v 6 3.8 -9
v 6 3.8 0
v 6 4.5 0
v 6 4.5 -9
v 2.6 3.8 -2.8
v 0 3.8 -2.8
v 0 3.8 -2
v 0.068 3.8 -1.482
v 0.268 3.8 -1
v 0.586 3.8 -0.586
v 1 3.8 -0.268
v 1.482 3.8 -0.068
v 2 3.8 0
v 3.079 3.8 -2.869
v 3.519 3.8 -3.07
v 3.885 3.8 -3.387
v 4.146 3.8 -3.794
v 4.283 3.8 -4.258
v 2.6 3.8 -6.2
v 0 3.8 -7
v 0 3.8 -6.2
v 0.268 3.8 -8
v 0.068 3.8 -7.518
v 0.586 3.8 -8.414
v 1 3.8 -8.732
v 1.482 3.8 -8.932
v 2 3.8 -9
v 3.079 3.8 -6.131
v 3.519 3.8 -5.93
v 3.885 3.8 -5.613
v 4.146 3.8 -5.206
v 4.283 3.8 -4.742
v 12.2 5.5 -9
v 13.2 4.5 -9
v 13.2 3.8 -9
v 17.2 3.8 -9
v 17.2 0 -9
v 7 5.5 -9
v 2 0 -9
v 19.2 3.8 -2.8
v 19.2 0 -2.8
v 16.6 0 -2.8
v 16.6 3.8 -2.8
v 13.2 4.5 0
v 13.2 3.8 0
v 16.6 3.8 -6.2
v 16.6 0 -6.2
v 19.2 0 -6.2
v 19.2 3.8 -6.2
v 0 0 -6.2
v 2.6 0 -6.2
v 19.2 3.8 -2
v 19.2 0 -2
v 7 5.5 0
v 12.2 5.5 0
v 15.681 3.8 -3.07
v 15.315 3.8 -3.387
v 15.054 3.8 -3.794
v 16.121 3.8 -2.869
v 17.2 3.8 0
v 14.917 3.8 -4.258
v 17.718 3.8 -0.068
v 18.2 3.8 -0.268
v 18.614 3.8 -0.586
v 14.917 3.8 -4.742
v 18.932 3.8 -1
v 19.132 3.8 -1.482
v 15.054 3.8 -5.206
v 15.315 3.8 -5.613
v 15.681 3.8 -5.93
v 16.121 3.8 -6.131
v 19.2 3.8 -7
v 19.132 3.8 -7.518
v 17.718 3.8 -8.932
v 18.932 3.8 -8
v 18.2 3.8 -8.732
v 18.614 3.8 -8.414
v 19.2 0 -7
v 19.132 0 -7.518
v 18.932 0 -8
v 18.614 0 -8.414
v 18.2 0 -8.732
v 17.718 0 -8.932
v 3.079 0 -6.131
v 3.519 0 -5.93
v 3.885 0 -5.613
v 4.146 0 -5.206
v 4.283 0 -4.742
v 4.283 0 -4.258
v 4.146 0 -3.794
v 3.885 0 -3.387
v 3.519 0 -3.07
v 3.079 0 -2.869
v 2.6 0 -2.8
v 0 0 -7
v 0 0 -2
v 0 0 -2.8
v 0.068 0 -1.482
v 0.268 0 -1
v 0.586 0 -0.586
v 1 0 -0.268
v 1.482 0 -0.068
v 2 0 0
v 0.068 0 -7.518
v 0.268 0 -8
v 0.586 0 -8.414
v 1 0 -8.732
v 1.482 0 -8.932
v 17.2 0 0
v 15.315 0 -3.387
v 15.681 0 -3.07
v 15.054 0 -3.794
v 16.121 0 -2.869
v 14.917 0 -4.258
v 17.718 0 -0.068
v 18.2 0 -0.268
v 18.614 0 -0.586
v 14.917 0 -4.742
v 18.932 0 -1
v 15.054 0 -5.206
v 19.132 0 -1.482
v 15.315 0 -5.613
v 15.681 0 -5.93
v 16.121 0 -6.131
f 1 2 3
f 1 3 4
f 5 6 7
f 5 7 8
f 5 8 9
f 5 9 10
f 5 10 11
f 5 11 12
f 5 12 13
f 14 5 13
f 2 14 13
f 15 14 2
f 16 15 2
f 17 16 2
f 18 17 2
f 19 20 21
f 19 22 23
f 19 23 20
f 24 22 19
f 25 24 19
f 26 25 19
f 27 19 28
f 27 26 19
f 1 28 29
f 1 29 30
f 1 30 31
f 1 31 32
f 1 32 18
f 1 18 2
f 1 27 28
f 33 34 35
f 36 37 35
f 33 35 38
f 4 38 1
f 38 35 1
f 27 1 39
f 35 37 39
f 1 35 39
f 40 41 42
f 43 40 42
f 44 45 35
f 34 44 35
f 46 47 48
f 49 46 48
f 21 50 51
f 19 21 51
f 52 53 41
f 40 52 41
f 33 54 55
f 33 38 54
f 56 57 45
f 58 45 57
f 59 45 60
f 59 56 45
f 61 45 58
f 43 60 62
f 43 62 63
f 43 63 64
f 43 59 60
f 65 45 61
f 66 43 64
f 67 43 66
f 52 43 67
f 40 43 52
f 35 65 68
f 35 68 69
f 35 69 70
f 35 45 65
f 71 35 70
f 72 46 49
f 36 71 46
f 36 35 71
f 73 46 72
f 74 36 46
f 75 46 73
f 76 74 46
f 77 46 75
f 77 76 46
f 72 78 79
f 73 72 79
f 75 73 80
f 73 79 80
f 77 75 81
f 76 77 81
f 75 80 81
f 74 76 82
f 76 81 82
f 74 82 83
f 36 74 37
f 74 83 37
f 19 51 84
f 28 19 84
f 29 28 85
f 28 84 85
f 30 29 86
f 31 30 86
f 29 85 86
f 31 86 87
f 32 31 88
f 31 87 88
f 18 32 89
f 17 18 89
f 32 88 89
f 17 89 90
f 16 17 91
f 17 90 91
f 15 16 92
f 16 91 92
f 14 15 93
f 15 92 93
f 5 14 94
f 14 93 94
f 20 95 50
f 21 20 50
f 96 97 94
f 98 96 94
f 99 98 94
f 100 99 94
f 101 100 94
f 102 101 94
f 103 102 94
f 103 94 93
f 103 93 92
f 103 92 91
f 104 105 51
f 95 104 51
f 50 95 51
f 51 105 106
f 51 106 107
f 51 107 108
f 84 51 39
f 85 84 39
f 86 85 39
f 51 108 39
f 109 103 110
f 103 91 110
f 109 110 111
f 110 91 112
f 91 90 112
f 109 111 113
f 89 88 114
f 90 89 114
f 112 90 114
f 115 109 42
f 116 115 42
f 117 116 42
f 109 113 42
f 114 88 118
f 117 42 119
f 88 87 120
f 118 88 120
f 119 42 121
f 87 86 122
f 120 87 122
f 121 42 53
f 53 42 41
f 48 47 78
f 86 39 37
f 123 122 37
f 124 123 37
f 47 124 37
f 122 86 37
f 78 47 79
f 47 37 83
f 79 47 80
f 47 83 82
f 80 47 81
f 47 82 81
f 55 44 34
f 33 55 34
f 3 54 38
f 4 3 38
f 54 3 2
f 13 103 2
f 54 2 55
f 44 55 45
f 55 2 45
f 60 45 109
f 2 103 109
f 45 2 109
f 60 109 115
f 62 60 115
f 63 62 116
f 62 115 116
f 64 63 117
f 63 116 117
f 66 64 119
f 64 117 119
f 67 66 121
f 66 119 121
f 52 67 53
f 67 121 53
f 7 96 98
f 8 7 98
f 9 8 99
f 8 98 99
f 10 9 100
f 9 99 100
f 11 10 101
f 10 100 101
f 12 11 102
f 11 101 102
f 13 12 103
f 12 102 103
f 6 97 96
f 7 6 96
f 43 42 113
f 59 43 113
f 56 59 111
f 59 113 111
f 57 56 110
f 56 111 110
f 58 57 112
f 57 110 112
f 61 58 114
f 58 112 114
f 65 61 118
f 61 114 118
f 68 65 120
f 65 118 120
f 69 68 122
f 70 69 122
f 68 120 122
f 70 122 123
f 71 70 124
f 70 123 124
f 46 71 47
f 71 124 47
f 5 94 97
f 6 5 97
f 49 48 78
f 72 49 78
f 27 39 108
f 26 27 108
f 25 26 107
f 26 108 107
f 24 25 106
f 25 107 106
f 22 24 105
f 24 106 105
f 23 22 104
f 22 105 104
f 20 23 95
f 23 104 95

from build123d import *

# Parameters (mm, degrees)
BOSS_EXTRUDE1_DEPTH = 3.8
SKETCH3_W           = 7.2
SKETCH3_H           = 9
BOSS_EXTRUDE2_DEPTH = 1.7
CHAMFER1_SIZE       = 1


with BuildPart() as part:
    # Sketch1 → Boss-Extrude1 (new body)
    with BuildSketch(Plane(origin=(0, 0, 0), x_dir=(1, 0, 0), z_dir=(0, 1, 0))):
        with BuildLine():
            Line((0, 6.2), (2.6, 6.2))
            ThreePointArc((2.6, 6.2), (4.3, 4.5), (2.6, 2.8))
            Line((2.6, 2.8), (0, 2.8))
            Line((0, 2.8), (0, 2))
            ThreePointArc((0, 2), (0.585786438, 0.585786438), (2, 0))
            Line((2, 0), (17.2, 0))
            ThreePointArc((17.2, 0), (18.614213562, 0.585786438), (19.2, 2))
            Line((19.2, 2), (19.2, 2.8))
            Line((19.2, 2.8), (16.6, 2.8))
            ThreePointArc((16.6, 2.8), (14.9, 4.5), (16.6, 6.2))
            Line((16.6, 6.2), (19.2, 6.2))
            Line((19.2, 6.2), (19.2, 7))
            ThreePointArc((19.2, 7), (18.614213562, 8.414213562), (17.2, 9))
            Line((17.2, 9), (2, 9))
            ThreePointArc((2, 9), (0.585786438, 8.414213562), (0, 7))
            Line((0, 7), (0, 6.2))
        make_face()
    extrude(amount=BOSS_EXTRUDE1_DEPTH)

    # Sketch3 → Boss-Extrude2 (add)
    with BuildSketch(Plane(origin=(0, 3.8, 0), x_dir=(1, 0, 0), z_dir=(0, 1, 0))):
        with Locations((9.6, 4.5)):
            Rectangle(SKETCH3_W, SKETCH3_H)
    extrude(amount=BOSS_EXTRUDE2_DEPTH)

    # Chamfer1
    chamfer1_edges = [part.edges().sort_by_distance(p)[0] for p in [
        (13.2, 5.5, -4.5),
        (6, 5.5, -4.5),
    ]]
    chamfer(chamfer1_edges, length=CHAMFER1_SIZE)


solid = part.part
